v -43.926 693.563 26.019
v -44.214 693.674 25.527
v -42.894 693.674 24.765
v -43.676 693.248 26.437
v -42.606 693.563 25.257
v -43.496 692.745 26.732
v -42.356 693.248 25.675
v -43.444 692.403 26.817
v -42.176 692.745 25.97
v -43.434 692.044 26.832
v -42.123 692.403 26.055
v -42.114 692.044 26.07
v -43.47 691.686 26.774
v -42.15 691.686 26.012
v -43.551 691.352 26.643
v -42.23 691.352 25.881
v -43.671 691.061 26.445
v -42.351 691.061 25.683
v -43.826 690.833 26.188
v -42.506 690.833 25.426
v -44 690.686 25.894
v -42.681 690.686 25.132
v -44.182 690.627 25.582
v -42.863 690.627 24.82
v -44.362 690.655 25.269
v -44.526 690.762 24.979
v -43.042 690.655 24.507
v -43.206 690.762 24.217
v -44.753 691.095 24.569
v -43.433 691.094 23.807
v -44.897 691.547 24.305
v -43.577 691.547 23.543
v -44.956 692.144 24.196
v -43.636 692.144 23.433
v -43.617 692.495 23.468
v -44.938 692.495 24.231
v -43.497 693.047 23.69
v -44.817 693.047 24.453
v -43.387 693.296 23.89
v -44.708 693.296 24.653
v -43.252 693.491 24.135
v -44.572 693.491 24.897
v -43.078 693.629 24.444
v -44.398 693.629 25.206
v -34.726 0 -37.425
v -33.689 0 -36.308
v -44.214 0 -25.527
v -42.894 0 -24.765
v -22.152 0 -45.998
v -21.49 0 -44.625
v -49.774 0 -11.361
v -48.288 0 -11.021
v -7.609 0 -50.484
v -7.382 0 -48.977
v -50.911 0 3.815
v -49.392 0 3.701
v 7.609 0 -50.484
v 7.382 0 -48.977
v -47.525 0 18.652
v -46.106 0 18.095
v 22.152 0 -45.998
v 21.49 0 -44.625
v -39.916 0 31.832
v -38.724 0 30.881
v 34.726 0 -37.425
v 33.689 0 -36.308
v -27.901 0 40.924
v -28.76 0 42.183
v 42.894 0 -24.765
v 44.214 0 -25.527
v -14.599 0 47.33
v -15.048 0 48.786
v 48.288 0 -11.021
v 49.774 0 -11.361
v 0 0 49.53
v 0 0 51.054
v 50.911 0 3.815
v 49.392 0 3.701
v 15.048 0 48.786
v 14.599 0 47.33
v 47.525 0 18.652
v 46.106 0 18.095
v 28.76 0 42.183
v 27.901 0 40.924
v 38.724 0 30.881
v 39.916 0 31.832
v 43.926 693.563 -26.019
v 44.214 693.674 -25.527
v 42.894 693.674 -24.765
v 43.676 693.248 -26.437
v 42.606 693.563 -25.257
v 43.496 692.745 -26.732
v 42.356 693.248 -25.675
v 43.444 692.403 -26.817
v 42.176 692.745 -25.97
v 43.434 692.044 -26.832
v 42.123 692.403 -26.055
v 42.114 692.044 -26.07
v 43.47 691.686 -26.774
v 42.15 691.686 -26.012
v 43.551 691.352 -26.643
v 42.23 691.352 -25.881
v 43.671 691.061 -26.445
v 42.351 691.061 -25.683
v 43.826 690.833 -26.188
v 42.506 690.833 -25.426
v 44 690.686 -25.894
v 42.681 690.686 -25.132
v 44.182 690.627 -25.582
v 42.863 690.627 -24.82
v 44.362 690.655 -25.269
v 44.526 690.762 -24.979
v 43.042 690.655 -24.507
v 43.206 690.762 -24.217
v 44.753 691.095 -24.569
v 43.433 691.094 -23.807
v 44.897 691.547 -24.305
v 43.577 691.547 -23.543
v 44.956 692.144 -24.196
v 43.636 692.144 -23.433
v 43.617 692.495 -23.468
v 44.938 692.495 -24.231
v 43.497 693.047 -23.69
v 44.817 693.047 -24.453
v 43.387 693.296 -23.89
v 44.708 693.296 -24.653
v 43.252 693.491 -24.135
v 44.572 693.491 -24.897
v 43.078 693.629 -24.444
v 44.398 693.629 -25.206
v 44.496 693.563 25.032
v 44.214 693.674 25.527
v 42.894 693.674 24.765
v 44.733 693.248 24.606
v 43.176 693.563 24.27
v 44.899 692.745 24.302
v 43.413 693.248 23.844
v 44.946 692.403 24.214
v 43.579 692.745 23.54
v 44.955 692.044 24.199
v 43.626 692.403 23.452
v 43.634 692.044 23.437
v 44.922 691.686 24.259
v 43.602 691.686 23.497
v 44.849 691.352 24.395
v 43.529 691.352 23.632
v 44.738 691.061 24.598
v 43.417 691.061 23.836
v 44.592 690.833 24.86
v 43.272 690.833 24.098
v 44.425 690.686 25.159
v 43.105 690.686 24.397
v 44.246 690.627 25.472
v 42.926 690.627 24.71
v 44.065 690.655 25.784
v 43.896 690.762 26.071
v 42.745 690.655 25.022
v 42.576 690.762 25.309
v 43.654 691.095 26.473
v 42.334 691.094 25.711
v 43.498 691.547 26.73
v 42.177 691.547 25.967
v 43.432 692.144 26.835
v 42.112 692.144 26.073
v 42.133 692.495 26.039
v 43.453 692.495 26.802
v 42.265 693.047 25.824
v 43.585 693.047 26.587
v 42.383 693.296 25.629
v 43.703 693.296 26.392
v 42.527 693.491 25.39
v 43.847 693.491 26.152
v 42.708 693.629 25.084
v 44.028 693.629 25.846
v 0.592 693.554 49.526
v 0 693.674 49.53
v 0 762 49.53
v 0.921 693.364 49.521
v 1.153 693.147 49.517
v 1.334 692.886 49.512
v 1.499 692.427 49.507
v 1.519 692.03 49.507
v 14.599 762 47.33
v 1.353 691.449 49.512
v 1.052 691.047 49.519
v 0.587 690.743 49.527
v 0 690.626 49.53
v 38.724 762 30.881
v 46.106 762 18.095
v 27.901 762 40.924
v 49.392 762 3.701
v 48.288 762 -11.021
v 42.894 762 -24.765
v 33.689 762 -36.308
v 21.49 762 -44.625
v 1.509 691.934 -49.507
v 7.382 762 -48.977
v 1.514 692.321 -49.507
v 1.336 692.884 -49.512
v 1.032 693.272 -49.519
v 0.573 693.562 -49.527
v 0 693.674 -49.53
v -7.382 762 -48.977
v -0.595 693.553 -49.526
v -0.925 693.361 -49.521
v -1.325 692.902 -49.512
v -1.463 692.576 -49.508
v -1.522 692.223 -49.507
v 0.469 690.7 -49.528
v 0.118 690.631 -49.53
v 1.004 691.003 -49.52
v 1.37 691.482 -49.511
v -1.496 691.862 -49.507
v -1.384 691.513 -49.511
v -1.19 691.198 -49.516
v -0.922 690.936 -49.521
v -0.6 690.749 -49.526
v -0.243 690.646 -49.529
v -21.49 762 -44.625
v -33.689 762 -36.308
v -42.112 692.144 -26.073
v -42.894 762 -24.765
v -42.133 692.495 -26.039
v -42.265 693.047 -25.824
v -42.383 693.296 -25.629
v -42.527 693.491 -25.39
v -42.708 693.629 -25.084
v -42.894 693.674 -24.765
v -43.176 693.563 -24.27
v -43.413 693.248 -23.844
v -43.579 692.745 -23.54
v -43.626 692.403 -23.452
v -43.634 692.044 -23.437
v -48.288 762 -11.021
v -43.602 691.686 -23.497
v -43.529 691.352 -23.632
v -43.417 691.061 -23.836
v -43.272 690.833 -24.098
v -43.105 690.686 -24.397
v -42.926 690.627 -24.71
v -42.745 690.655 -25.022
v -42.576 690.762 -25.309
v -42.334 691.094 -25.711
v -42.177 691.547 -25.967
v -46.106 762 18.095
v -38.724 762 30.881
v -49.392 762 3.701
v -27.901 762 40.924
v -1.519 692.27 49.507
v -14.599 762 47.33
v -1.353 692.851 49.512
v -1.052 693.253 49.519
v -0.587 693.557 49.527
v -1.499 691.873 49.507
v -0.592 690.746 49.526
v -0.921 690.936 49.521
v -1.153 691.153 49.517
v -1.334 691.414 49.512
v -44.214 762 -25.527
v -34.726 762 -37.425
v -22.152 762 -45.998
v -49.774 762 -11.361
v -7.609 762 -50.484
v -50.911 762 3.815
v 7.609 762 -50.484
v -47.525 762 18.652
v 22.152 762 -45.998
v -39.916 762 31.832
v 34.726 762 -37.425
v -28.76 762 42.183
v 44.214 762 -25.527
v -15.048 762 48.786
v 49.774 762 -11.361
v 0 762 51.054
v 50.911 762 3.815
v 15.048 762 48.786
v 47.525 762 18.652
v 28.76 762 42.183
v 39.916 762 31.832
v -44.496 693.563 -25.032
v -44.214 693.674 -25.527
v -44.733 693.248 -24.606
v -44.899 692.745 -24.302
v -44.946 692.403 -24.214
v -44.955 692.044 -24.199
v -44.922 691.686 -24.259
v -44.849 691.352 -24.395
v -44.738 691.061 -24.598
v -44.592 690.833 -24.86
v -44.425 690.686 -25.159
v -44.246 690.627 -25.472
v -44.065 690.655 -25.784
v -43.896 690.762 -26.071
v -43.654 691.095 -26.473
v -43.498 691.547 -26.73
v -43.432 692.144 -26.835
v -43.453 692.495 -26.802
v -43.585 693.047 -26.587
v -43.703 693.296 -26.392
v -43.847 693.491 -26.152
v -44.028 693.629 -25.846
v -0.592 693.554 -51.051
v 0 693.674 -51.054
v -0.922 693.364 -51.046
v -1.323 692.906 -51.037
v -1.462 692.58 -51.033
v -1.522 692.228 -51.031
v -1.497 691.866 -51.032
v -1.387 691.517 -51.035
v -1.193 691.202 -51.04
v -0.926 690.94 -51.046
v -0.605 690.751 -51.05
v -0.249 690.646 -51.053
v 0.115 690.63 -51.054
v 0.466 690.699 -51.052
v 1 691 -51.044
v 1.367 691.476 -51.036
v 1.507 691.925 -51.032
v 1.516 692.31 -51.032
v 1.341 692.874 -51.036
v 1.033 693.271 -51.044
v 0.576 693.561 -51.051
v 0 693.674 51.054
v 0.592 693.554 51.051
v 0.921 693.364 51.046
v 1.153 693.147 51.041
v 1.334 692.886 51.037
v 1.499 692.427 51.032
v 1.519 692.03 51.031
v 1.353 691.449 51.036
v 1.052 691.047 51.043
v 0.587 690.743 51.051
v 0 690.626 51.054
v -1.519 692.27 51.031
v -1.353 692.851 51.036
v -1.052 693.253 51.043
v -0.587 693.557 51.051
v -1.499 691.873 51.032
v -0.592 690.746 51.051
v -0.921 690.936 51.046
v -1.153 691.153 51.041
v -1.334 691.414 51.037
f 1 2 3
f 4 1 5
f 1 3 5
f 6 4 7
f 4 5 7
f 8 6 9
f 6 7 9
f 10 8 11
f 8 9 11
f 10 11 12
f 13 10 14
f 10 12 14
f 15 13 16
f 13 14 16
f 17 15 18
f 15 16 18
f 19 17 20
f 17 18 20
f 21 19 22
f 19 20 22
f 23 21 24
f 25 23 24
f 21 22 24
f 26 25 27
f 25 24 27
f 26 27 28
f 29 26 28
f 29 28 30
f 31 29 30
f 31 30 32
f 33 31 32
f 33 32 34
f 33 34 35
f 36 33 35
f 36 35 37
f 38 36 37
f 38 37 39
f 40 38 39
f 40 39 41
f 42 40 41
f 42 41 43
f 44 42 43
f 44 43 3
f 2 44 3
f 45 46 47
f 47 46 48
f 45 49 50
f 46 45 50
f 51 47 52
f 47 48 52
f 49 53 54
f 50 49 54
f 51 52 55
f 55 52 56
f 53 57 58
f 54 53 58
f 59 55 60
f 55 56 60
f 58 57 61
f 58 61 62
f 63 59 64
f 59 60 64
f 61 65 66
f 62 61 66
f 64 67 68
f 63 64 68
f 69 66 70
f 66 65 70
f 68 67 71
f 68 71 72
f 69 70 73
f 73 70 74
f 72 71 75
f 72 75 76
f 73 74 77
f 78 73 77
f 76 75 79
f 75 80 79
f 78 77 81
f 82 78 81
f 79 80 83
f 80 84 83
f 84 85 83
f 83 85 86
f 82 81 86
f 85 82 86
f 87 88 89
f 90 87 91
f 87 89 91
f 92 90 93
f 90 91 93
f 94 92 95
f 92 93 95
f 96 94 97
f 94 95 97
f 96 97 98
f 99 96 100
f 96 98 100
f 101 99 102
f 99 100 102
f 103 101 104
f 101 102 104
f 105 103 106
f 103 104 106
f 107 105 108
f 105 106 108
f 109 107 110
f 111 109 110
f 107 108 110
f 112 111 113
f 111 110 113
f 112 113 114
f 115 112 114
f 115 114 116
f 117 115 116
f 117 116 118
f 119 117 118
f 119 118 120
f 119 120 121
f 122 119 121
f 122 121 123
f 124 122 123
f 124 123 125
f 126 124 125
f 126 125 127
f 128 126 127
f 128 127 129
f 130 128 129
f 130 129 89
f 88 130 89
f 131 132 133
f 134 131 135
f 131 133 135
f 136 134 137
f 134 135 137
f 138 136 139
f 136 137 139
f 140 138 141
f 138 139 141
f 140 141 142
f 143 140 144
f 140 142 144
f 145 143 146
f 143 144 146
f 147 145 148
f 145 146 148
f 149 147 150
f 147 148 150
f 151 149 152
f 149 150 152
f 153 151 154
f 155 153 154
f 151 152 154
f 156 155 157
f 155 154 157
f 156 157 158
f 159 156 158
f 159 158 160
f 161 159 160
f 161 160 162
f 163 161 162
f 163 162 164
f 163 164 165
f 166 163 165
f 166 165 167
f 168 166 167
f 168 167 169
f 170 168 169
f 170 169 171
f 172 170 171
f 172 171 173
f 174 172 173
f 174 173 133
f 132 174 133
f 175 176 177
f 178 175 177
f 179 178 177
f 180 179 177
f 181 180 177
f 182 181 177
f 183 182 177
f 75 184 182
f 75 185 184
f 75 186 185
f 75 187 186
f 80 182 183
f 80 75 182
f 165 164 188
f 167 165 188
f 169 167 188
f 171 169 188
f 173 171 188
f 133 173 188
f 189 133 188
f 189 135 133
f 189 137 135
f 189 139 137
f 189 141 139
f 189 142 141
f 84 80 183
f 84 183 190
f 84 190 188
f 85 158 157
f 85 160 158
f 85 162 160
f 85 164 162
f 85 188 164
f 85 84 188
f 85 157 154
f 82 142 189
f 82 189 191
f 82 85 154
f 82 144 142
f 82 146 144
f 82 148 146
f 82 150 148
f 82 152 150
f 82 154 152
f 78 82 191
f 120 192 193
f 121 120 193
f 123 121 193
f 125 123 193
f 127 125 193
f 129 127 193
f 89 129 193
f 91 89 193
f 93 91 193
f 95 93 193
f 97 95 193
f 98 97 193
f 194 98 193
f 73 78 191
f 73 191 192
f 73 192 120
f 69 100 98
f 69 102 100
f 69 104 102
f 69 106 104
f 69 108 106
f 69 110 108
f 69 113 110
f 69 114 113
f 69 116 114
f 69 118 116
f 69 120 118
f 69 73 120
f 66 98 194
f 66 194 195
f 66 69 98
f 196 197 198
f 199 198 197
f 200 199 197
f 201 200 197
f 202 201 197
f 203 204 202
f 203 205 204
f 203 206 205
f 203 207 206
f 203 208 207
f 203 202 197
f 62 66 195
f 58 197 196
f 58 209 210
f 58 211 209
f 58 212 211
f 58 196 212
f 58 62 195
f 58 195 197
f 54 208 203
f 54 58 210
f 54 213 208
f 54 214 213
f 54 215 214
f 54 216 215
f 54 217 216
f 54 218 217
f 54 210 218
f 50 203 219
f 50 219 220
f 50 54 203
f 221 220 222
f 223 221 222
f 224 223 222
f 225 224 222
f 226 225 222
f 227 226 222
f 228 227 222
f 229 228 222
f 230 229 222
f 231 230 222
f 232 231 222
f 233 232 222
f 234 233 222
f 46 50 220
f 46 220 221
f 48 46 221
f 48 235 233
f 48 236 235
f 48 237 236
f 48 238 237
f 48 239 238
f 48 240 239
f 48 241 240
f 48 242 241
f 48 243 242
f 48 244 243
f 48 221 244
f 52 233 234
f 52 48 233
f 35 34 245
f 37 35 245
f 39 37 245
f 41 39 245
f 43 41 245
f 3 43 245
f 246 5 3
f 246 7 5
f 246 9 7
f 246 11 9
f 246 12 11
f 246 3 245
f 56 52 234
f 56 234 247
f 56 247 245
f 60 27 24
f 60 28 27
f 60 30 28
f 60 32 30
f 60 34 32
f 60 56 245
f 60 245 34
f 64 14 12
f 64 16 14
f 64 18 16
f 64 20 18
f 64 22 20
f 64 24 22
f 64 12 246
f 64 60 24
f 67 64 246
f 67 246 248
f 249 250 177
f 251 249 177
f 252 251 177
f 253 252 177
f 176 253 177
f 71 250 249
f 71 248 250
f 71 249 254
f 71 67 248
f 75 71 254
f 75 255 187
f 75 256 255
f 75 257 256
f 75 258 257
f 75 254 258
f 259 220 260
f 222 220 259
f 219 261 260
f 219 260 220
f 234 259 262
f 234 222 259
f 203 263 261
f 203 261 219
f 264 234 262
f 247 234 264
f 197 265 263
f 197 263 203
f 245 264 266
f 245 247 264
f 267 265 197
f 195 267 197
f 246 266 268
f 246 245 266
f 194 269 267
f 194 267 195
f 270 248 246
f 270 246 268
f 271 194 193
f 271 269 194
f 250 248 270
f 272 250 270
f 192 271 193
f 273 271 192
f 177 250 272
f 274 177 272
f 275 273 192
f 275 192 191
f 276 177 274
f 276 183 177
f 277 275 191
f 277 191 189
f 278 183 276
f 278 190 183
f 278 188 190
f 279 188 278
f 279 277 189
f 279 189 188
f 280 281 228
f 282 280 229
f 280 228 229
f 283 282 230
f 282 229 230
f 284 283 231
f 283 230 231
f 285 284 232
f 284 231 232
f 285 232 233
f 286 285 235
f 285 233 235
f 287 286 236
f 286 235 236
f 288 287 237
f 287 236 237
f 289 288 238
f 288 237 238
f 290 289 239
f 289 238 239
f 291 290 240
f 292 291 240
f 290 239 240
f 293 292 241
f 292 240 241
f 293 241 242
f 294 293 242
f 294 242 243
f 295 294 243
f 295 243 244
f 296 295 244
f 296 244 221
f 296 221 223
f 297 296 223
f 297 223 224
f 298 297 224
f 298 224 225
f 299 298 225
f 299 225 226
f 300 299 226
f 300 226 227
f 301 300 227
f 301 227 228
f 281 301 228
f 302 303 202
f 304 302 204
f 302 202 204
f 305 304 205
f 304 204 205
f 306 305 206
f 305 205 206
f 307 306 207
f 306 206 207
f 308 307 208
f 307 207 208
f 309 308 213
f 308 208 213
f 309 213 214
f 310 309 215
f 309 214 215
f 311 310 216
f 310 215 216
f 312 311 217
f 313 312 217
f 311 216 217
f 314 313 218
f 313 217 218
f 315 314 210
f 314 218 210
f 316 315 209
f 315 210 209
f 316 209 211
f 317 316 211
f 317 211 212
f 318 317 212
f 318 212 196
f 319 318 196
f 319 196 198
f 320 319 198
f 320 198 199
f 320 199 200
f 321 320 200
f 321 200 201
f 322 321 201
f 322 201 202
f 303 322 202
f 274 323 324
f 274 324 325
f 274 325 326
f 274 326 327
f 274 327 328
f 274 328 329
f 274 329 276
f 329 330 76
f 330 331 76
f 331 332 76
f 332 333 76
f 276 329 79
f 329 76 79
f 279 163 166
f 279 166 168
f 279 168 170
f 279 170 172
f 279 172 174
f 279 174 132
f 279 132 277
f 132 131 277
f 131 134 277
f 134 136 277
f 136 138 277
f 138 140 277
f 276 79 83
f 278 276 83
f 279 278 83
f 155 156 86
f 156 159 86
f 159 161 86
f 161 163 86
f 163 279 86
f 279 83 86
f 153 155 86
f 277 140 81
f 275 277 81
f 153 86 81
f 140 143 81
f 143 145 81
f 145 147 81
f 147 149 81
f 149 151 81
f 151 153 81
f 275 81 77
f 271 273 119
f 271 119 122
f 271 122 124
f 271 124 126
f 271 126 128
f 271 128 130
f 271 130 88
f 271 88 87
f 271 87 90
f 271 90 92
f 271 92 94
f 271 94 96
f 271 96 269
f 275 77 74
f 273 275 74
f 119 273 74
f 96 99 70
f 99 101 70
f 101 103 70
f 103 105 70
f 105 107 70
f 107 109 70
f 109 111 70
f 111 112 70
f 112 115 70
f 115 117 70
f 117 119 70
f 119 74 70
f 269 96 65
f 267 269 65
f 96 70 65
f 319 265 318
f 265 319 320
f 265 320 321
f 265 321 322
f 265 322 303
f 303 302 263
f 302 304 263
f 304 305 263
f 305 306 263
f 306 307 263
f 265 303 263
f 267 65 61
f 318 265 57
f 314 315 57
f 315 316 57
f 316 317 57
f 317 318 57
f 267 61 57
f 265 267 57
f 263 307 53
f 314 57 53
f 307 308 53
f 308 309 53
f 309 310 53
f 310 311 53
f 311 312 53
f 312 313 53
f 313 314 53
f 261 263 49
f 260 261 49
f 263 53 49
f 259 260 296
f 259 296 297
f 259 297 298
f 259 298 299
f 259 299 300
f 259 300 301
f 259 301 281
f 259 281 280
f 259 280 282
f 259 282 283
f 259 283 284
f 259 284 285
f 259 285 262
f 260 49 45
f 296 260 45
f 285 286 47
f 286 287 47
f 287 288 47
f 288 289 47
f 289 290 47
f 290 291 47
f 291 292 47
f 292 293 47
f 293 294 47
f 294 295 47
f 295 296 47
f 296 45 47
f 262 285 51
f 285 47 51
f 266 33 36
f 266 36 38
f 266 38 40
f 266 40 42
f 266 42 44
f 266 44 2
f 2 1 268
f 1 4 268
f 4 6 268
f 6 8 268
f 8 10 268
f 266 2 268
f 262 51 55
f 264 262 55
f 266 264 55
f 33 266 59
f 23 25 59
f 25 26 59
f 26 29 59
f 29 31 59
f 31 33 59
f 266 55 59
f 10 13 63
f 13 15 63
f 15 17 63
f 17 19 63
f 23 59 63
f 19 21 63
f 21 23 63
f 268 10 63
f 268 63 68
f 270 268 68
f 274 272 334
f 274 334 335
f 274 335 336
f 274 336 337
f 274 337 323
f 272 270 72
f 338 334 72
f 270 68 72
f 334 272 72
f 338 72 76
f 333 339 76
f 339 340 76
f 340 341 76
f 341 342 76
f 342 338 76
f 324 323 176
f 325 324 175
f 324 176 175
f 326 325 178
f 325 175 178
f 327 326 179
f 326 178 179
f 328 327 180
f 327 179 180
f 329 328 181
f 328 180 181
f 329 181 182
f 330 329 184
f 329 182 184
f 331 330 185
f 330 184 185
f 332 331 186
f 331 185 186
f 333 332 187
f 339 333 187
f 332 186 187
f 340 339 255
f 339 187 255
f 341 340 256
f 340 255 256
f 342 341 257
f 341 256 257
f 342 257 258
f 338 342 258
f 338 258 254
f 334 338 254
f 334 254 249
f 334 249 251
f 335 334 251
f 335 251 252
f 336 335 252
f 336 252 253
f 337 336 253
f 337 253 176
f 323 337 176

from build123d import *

# Parameters (mm, degrees)
SKETCH1_R           = 51.054
SKETCH1_R_2         = 49.53
BOSS_EXTRUDE1_DEPTH = 762
SKETCH2_R           = 1.524
CUT_EXTRUDE1_DEPTH  = 66.04
CIRPATTERN1_COUNT   = 6


with BuildPart() as part:
    # Sketch1 → Boss-Extrude1 (new body)
    with BuildSketch(Plane(origin=(0, 0, 0), x_dir=(1, 0, 0), z_dir=(0, 1, 0))):
        with Locations(Location((0, 0, 0), (0, 0, 270))):
            Circle(SKETCH1_R)
        with Locations(Location((0, 0, 0), (0, 0, 270))):
            Circle(SKETCH1_R_2, mode=Mode.SUBTRACT)
    extrude(amount=BOSS_EXTRUDE1_DEPTH)

    # Sketch2 → Cut-Extrude1 (cut)
    with BuildSketch(Plane.XY):
        with Locations(Location((0, 692.15, 0), (0, 0, 90))):
            Circle(SKETCH2_R)
    cut_extrude1 = extrude(amount=-CUT_EXTRUDE1_DEPTH, mode=Mode.SUBTRACT)

    # CirPattern1: Cut-Extrude1 ×6 about axis
    cirpattern1_axis = Axis((0, 762, 0), (0, -1, 0))
    for i in range(1, CIRPATTERN1_COUNT):
        add(cut_extrude1.rotate(cirpattern1_axis, i * 360 / CIRPATTERN1_COUNT), mode=Mode.SUBTRACT)


solid = part.part
